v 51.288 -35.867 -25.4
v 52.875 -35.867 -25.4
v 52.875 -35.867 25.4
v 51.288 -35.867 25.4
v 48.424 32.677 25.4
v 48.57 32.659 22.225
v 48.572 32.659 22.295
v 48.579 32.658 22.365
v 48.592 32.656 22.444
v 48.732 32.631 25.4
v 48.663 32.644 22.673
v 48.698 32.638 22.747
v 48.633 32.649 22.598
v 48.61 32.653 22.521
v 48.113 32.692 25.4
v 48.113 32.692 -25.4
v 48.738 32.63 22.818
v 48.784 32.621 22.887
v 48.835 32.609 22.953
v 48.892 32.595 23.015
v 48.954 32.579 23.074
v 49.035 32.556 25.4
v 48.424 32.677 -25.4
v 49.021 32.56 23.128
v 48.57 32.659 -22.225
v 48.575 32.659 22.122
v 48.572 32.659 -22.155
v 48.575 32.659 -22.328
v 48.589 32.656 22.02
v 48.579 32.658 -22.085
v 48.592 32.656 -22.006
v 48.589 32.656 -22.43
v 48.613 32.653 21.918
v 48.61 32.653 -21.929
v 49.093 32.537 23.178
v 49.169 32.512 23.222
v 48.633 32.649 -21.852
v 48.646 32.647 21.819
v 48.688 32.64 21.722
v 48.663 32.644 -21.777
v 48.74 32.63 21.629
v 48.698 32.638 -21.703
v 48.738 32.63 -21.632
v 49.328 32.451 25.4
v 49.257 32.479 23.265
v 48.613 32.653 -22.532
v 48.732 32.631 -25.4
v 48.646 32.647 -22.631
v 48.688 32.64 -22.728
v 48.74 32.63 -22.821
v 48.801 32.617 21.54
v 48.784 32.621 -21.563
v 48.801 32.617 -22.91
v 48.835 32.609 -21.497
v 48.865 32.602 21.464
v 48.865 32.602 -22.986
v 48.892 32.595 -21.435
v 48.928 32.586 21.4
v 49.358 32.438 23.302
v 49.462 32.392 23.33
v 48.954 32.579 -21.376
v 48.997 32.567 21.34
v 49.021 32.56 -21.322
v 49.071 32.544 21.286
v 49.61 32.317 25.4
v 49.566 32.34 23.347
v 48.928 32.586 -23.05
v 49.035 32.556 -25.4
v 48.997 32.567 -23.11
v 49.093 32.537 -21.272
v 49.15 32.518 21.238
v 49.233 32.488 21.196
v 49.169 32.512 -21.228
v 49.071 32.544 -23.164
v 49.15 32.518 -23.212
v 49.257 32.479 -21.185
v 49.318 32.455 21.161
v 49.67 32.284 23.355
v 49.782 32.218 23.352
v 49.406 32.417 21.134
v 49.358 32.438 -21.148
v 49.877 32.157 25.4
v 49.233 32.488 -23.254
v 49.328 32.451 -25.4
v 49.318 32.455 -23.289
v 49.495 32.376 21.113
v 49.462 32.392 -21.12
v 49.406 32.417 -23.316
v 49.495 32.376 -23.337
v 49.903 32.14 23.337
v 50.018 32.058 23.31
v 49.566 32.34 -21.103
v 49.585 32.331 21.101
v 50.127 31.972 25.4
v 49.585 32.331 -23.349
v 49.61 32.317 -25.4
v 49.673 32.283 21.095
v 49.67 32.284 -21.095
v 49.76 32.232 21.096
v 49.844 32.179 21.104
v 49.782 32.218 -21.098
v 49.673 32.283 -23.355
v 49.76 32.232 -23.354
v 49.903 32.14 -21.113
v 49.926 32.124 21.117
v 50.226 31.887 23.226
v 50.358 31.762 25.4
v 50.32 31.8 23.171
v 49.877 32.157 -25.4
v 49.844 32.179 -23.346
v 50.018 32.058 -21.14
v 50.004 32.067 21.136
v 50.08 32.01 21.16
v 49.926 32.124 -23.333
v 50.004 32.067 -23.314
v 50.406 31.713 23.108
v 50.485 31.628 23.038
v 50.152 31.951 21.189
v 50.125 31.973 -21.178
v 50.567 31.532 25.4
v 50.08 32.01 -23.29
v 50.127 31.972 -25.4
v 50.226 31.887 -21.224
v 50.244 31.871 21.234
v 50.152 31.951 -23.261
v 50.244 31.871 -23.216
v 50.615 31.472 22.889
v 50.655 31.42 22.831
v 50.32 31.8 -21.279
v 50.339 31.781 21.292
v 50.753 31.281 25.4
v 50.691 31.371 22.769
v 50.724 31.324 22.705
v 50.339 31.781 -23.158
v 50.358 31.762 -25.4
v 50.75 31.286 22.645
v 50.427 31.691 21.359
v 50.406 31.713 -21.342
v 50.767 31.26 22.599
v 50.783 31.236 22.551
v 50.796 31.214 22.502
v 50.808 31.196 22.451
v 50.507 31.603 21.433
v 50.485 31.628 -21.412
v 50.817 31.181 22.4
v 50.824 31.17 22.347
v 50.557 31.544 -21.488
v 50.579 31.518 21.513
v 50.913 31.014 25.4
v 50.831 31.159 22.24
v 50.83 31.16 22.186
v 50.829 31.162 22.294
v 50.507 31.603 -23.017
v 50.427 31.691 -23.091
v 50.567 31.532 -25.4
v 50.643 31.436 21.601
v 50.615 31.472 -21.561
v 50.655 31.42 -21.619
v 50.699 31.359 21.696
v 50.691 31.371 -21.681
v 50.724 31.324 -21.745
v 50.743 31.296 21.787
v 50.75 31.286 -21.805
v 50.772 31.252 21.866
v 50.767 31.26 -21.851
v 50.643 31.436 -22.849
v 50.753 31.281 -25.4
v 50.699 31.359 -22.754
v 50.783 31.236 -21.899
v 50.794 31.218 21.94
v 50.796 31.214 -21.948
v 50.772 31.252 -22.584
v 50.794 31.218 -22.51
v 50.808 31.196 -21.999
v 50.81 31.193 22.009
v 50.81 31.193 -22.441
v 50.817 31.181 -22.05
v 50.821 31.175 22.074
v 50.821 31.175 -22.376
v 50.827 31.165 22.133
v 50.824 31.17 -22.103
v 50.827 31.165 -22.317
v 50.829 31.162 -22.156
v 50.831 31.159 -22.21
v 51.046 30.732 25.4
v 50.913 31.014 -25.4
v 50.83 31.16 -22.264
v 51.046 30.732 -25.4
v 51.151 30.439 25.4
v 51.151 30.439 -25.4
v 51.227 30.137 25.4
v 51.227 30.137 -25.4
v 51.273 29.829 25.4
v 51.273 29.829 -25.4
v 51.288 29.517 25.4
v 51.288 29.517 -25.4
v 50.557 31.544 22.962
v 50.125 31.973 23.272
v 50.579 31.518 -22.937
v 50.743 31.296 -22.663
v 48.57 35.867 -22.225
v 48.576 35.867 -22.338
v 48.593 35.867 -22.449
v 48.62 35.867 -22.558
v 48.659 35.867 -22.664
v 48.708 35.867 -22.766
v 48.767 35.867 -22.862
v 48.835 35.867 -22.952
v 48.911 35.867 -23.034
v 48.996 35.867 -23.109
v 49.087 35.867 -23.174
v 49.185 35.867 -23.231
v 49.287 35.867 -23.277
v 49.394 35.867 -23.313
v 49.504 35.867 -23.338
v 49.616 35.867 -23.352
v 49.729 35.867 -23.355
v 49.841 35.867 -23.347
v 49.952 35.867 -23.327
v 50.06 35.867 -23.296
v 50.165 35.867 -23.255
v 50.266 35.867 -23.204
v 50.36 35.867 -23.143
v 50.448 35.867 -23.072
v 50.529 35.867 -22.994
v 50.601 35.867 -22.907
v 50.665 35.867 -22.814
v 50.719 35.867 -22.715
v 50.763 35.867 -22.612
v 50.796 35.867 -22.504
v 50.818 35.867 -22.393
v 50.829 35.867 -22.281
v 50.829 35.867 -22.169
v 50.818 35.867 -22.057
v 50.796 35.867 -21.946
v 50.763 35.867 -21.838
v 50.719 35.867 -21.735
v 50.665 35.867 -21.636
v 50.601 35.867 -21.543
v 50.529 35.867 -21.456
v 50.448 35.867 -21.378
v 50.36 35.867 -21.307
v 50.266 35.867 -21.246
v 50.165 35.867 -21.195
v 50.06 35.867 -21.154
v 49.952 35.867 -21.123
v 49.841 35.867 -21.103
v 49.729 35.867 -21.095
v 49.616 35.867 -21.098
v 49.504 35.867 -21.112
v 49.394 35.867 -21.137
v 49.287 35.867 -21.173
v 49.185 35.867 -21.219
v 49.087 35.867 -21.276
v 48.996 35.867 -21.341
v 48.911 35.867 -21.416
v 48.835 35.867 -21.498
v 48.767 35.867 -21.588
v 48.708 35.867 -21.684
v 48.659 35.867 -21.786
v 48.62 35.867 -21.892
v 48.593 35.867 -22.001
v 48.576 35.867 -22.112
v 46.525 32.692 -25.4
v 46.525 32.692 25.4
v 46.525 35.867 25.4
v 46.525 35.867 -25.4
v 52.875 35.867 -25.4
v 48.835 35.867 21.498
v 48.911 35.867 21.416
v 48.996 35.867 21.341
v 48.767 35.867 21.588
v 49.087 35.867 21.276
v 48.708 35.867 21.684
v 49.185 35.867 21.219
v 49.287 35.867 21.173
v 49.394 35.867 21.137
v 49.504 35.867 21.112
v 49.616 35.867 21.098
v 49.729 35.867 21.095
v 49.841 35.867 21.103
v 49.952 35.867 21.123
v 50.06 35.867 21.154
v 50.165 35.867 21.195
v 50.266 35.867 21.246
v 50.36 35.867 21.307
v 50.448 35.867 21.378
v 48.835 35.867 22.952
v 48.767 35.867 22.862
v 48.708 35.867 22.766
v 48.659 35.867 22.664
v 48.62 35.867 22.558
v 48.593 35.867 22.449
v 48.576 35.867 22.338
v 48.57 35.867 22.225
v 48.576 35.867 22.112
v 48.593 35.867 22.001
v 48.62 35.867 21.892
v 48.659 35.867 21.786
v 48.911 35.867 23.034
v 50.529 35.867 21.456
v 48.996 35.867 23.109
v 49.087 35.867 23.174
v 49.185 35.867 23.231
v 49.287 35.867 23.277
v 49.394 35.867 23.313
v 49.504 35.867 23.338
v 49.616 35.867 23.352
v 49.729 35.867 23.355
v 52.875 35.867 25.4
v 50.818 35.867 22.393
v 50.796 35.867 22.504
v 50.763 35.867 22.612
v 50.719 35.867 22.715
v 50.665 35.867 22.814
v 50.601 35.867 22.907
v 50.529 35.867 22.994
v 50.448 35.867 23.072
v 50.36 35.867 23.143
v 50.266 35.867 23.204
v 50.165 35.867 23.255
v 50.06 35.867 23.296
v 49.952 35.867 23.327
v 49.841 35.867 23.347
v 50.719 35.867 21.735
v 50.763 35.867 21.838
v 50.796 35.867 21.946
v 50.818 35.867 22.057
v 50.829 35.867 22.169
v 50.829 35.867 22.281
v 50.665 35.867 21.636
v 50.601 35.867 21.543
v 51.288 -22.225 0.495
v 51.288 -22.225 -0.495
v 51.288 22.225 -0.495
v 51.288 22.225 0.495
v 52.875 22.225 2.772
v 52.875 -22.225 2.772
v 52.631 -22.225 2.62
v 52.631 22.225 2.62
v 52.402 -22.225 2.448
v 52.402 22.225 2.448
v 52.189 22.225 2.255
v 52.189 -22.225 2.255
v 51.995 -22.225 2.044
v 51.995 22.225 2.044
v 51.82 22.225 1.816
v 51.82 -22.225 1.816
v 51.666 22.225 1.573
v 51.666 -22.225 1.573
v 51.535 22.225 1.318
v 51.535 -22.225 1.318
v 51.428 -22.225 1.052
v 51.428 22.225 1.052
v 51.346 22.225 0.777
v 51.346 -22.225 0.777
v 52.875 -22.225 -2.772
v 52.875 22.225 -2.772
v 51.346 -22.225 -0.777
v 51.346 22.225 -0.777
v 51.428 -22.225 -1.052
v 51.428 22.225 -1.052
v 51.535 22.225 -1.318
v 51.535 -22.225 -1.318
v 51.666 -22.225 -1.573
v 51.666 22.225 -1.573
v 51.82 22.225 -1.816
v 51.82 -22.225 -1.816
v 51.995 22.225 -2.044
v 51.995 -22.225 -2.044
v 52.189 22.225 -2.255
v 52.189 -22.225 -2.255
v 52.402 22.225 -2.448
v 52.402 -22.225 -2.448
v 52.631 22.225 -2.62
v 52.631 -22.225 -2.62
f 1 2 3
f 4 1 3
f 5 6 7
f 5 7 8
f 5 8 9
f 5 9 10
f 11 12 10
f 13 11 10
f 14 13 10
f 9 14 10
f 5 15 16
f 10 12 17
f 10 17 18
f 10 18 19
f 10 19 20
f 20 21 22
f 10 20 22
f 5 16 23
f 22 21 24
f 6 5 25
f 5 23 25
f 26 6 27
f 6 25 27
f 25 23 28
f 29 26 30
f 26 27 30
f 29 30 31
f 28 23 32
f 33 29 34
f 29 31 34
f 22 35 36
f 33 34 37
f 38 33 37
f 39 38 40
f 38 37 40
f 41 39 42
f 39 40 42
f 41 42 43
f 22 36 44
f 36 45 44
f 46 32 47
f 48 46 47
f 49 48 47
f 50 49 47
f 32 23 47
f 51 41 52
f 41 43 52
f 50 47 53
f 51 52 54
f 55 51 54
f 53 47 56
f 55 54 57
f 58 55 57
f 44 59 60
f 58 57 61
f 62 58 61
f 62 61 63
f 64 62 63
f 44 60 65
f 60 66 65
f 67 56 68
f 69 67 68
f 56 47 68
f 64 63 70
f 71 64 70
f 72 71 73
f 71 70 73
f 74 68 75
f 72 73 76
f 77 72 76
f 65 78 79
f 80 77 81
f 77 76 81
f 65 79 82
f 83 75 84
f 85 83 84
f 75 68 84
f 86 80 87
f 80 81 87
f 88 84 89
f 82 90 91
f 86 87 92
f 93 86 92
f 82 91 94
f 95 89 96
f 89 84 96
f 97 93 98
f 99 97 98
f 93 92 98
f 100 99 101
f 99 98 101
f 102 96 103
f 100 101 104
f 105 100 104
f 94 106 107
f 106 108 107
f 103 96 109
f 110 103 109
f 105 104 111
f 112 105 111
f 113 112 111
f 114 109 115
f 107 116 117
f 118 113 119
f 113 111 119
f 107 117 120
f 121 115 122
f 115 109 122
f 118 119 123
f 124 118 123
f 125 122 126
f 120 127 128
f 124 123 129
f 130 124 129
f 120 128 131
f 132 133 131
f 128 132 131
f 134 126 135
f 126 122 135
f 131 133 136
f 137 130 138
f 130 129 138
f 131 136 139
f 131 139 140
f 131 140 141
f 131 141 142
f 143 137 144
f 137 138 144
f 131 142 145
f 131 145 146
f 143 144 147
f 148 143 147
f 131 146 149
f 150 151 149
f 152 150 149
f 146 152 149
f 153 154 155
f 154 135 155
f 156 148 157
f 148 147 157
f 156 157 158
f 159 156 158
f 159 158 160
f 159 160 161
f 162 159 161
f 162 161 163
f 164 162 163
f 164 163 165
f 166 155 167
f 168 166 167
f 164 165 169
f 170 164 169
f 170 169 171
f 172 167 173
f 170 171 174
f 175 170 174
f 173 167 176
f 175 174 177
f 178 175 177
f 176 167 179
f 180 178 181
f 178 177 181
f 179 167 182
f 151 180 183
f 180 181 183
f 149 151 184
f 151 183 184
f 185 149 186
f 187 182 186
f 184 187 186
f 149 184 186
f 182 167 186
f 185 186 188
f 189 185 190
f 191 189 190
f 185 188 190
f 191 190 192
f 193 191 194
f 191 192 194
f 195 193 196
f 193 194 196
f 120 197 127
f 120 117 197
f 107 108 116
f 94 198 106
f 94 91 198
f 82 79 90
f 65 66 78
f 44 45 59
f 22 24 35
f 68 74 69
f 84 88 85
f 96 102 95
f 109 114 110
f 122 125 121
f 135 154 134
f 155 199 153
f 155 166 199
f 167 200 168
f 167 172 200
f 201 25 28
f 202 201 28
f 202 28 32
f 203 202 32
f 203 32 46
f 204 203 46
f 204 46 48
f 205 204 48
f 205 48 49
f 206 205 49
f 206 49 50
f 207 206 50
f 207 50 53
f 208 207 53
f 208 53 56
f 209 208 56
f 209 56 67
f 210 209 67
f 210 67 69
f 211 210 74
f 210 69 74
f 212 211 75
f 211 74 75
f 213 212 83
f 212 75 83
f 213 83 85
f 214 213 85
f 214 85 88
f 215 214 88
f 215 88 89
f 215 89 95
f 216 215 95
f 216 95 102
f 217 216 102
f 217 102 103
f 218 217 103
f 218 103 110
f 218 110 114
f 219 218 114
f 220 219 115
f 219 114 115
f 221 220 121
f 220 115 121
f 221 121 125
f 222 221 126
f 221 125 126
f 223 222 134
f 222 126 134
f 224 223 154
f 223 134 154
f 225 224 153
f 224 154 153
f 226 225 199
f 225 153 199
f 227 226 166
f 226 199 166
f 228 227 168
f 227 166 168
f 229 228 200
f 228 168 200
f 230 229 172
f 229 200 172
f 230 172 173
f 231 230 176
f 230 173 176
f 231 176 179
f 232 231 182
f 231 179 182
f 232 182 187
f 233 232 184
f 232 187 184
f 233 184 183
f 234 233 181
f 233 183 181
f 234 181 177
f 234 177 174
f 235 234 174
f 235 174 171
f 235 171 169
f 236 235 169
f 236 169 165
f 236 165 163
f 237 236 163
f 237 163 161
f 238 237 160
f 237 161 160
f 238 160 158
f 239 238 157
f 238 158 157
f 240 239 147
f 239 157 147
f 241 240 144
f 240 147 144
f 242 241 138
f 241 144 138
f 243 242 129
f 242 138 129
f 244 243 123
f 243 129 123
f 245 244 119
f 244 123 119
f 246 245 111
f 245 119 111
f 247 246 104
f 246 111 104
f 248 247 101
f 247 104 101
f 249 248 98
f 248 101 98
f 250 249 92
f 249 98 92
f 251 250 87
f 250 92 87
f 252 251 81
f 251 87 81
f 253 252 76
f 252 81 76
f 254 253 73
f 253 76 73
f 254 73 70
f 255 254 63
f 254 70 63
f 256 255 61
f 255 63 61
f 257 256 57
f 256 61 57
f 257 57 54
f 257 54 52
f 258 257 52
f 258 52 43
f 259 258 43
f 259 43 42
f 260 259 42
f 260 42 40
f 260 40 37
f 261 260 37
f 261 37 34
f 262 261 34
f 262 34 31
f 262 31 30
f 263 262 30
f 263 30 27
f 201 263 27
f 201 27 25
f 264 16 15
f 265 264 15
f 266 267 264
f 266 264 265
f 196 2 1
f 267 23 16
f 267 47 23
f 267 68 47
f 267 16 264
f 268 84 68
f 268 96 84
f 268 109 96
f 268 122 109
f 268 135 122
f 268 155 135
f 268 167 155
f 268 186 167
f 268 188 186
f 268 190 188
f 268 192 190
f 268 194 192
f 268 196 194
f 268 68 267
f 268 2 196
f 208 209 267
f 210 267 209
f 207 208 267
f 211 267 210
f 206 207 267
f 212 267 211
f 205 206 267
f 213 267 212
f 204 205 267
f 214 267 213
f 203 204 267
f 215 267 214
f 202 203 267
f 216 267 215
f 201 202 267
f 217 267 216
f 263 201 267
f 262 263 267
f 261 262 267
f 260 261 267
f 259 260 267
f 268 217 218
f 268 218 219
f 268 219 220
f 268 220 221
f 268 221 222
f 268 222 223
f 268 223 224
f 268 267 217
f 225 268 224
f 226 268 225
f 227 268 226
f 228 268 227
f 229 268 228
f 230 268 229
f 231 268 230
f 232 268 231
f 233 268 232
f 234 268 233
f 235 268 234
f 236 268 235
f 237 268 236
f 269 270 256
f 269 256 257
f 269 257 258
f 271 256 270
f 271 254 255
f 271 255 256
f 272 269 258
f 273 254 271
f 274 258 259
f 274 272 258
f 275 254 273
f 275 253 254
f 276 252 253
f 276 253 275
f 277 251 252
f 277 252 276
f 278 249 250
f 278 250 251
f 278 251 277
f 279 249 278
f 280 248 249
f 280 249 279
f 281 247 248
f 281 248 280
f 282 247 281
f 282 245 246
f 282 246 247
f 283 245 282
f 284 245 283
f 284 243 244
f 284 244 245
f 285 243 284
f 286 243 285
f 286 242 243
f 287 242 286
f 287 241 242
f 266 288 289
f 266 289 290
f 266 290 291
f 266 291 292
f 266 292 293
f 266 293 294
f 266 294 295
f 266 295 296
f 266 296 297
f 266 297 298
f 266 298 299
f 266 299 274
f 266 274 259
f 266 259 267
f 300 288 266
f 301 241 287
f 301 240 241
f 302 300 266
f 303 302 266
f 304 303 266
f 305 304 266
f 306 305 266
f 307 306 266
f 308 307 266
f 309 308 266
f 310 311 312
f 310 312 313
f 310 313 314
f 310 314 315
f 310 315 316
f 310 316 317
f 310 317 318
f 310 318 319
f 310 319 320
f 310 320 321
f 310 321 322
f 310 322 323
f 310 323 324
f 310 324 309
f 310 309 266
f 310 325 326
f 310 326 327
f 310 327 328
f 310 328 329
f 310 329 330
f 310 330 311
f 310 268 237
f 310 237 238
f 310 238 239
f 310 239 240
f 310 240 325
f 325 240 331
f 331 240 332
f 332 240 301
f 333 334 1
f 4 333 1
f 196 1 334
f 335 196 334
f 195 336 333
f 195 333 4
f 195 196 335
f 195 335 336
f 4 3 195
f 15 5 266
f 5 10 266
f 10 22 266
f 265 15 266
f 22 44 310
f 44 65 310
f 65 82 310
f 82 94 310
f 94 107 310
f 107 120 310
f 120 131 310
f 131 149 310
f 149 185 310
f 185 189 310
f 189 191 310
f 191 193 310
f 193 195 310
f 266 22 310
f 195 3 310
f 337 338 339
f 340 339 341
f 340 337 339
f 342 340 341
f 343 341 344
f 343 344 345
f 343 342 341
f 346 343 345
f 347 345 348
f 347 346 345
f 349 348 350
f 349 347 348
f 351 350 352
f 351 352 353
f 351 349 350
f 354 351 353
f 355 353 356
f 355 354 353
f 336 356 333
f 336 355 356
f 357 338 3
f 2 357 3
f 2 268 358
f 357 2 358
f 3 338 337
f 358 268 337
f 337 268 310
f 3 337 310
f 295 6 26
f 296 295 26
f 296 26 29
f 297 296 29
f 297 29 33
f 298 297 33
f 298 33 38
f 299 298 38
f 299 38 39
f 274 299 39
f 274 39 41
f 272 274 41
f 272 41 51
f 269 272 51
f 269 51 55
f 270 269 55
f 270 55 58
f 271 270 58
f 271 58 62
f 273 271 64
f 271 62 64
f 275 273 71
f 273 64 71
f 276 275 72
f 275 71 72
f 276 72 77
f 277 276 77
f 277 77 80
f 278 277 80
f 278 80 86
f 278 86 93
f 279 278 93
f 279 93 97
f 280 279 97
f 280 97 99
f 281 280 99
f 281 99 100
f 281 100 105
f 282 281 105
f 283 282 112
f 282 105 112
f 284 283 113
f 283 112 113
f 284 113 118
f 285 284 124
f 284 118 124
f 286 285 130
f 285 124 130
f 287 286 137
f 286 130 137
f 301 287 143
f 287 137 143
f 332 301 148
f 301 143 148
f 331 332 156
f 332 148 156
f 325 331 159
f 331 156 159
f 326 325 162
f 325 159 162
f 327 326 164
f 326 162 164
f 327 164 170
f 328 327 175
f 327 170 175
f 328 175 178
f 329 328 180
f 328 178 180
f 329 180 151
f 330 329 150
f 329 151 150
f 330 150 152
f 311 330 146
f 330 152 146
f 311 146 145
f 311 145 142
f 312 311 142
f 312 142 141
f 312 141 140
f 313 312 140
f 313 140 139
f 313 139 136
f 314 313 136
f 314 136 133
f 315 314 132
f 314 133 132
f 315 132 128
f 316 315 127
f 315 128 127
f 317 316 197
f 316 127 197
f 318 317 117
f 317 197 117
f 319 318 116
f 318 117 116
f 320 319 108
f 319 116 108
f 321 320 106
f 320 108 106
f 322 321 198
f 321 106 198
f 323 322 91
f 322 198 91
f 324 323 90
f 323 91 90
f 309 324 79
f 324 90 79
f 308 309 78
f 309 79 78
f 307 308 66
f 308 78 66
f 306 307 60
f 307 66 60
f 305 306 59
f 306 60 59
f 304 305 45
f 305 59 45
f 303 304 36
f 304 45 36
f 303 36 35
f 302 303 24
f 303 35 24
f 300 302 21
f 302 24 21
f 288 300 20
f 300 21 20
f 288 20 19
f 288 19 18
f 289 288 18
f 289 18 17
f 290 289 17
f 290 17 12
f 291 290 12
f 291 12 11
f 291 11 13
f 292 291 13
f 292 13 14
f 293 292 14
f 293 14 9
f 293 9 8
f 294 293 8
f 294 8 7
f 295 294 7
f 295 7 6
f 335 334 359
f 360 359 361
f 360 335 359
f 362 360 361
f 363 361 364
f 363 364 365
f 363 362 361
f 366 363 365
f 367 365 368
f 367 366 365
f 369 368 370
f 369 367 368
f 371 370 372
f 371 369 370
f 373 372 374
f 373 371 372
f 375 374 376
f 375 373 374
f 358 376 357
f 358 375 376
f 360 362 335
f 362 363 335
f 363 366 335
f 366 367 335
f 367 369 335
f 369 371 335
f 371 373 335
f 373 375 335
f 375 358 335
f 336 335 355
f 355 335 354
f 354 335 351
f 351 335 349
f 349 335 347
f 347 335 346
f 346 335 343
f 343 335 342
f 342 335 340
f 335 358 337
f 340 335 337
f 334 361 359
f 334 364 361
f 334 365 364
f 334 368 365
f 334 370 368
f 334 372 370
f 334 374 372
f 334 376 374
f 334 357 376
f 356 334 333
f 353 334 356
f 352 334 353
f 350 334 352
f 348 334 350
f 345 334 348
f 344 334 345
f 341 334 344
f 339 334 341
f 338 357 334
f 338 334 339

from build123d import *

# Parameters (mm, degrees)
SKETCH2_W                     = 50.8
SKETCH2_H                     = 71.73468
SKETCH2_W_2                   = 0.9906
SKETCH2_H_2                   = 44.45
BOSS_EXTRUDE1_DEPTH           = 1.5875
SKETCH3_W                     = 50.8
SKETCH3_H                     = 3.175
BOSS_EXTRUDE2_DEPTH           = 6.35
FILLET1_R                     = 3.175
TAP_DRILL_FOR_4_40_TAP1_D     = 2.2606
TAP_DRILL_FOR_4_40_TAP1_DEPTH = 6.35
TAP_DRILL_FOR_4_40_TAP1_TIP   = 0.679152758
SKETCH7_R                     = 3.175
CUT_EXTRUDE1_DEPTH            = 44.45


with BuildPart() as part:
    # Sketch2 → Boss-Extrude1 (new body)
    with BuildSketch(Plane.ZY.offset(-52.8754333)):
        Rectangle(SKETCH2_W, SKETCH2_H)
        Rectangle(SKETCH2_W_2, SKETCH2_H_2, mode=Mode.SUBTRACT)
    extrude(amount=BOSS_EXTRUDE1_DEPTH)

    # Sketch3 → Boss-Extrude2 (add)
    with BuildSketch(Plane.ZY.offset(-52.8754333)):
        with Locations((0, 34.27984)):
            Rectangle(SKETCH3_W, SKETCH3_H)
    extrude(amount=BOSS_EXTRUDE2_DEPTH)

    # Fillet1
    fillet1_edges = [part.edges().sort_by_distance(p)[0] for p in [
        (51.2879333, 32.69234, 0),
    ]]
    fillet(fillet1_edges, radius=FILLET1_R)

    # Tap Drill for #4-40 Tap1
    with Locations(Plane(origin=(0, 35.86734, 0), x_dir=(1, 0, 0), z_dir=(0, 1, 0))):
        with Locations((49.7004333, -22.225), (49.7004333, 22.225)):
            Hole(TAP_DRILL_FOR_4_40_TAP1_D / 2, depth=TAP_DRILL_FOR_4_40_TAP1_DEPTH)
            with Locations((0, 0, -(TAP_DRILL_FOR_4_40_TAP1_DEPTH + TAP_DRILL_FOR_4_40_TAP1_TIP / 2))):  # 118° drill point
                Cone(0, TAP_DRILL_FOR_4_40_TAP1_D / 2, TAP_DRILL_FOR_4_40_TAP1_TIP, mode=Mode.SUBTRACT)

    # Sketch7 → Cut-Extrude1 (cut)
    with BuildSketch(Plane.XZ.offset(-22.225)):
        with Locations((54.42406195, 0)):
            Circle(SKETCH7_R)
    extrude(amount=CUT_EXTRUDE1_DEPTH, mode=Mode.SUBTRACT)


solid = part.part
